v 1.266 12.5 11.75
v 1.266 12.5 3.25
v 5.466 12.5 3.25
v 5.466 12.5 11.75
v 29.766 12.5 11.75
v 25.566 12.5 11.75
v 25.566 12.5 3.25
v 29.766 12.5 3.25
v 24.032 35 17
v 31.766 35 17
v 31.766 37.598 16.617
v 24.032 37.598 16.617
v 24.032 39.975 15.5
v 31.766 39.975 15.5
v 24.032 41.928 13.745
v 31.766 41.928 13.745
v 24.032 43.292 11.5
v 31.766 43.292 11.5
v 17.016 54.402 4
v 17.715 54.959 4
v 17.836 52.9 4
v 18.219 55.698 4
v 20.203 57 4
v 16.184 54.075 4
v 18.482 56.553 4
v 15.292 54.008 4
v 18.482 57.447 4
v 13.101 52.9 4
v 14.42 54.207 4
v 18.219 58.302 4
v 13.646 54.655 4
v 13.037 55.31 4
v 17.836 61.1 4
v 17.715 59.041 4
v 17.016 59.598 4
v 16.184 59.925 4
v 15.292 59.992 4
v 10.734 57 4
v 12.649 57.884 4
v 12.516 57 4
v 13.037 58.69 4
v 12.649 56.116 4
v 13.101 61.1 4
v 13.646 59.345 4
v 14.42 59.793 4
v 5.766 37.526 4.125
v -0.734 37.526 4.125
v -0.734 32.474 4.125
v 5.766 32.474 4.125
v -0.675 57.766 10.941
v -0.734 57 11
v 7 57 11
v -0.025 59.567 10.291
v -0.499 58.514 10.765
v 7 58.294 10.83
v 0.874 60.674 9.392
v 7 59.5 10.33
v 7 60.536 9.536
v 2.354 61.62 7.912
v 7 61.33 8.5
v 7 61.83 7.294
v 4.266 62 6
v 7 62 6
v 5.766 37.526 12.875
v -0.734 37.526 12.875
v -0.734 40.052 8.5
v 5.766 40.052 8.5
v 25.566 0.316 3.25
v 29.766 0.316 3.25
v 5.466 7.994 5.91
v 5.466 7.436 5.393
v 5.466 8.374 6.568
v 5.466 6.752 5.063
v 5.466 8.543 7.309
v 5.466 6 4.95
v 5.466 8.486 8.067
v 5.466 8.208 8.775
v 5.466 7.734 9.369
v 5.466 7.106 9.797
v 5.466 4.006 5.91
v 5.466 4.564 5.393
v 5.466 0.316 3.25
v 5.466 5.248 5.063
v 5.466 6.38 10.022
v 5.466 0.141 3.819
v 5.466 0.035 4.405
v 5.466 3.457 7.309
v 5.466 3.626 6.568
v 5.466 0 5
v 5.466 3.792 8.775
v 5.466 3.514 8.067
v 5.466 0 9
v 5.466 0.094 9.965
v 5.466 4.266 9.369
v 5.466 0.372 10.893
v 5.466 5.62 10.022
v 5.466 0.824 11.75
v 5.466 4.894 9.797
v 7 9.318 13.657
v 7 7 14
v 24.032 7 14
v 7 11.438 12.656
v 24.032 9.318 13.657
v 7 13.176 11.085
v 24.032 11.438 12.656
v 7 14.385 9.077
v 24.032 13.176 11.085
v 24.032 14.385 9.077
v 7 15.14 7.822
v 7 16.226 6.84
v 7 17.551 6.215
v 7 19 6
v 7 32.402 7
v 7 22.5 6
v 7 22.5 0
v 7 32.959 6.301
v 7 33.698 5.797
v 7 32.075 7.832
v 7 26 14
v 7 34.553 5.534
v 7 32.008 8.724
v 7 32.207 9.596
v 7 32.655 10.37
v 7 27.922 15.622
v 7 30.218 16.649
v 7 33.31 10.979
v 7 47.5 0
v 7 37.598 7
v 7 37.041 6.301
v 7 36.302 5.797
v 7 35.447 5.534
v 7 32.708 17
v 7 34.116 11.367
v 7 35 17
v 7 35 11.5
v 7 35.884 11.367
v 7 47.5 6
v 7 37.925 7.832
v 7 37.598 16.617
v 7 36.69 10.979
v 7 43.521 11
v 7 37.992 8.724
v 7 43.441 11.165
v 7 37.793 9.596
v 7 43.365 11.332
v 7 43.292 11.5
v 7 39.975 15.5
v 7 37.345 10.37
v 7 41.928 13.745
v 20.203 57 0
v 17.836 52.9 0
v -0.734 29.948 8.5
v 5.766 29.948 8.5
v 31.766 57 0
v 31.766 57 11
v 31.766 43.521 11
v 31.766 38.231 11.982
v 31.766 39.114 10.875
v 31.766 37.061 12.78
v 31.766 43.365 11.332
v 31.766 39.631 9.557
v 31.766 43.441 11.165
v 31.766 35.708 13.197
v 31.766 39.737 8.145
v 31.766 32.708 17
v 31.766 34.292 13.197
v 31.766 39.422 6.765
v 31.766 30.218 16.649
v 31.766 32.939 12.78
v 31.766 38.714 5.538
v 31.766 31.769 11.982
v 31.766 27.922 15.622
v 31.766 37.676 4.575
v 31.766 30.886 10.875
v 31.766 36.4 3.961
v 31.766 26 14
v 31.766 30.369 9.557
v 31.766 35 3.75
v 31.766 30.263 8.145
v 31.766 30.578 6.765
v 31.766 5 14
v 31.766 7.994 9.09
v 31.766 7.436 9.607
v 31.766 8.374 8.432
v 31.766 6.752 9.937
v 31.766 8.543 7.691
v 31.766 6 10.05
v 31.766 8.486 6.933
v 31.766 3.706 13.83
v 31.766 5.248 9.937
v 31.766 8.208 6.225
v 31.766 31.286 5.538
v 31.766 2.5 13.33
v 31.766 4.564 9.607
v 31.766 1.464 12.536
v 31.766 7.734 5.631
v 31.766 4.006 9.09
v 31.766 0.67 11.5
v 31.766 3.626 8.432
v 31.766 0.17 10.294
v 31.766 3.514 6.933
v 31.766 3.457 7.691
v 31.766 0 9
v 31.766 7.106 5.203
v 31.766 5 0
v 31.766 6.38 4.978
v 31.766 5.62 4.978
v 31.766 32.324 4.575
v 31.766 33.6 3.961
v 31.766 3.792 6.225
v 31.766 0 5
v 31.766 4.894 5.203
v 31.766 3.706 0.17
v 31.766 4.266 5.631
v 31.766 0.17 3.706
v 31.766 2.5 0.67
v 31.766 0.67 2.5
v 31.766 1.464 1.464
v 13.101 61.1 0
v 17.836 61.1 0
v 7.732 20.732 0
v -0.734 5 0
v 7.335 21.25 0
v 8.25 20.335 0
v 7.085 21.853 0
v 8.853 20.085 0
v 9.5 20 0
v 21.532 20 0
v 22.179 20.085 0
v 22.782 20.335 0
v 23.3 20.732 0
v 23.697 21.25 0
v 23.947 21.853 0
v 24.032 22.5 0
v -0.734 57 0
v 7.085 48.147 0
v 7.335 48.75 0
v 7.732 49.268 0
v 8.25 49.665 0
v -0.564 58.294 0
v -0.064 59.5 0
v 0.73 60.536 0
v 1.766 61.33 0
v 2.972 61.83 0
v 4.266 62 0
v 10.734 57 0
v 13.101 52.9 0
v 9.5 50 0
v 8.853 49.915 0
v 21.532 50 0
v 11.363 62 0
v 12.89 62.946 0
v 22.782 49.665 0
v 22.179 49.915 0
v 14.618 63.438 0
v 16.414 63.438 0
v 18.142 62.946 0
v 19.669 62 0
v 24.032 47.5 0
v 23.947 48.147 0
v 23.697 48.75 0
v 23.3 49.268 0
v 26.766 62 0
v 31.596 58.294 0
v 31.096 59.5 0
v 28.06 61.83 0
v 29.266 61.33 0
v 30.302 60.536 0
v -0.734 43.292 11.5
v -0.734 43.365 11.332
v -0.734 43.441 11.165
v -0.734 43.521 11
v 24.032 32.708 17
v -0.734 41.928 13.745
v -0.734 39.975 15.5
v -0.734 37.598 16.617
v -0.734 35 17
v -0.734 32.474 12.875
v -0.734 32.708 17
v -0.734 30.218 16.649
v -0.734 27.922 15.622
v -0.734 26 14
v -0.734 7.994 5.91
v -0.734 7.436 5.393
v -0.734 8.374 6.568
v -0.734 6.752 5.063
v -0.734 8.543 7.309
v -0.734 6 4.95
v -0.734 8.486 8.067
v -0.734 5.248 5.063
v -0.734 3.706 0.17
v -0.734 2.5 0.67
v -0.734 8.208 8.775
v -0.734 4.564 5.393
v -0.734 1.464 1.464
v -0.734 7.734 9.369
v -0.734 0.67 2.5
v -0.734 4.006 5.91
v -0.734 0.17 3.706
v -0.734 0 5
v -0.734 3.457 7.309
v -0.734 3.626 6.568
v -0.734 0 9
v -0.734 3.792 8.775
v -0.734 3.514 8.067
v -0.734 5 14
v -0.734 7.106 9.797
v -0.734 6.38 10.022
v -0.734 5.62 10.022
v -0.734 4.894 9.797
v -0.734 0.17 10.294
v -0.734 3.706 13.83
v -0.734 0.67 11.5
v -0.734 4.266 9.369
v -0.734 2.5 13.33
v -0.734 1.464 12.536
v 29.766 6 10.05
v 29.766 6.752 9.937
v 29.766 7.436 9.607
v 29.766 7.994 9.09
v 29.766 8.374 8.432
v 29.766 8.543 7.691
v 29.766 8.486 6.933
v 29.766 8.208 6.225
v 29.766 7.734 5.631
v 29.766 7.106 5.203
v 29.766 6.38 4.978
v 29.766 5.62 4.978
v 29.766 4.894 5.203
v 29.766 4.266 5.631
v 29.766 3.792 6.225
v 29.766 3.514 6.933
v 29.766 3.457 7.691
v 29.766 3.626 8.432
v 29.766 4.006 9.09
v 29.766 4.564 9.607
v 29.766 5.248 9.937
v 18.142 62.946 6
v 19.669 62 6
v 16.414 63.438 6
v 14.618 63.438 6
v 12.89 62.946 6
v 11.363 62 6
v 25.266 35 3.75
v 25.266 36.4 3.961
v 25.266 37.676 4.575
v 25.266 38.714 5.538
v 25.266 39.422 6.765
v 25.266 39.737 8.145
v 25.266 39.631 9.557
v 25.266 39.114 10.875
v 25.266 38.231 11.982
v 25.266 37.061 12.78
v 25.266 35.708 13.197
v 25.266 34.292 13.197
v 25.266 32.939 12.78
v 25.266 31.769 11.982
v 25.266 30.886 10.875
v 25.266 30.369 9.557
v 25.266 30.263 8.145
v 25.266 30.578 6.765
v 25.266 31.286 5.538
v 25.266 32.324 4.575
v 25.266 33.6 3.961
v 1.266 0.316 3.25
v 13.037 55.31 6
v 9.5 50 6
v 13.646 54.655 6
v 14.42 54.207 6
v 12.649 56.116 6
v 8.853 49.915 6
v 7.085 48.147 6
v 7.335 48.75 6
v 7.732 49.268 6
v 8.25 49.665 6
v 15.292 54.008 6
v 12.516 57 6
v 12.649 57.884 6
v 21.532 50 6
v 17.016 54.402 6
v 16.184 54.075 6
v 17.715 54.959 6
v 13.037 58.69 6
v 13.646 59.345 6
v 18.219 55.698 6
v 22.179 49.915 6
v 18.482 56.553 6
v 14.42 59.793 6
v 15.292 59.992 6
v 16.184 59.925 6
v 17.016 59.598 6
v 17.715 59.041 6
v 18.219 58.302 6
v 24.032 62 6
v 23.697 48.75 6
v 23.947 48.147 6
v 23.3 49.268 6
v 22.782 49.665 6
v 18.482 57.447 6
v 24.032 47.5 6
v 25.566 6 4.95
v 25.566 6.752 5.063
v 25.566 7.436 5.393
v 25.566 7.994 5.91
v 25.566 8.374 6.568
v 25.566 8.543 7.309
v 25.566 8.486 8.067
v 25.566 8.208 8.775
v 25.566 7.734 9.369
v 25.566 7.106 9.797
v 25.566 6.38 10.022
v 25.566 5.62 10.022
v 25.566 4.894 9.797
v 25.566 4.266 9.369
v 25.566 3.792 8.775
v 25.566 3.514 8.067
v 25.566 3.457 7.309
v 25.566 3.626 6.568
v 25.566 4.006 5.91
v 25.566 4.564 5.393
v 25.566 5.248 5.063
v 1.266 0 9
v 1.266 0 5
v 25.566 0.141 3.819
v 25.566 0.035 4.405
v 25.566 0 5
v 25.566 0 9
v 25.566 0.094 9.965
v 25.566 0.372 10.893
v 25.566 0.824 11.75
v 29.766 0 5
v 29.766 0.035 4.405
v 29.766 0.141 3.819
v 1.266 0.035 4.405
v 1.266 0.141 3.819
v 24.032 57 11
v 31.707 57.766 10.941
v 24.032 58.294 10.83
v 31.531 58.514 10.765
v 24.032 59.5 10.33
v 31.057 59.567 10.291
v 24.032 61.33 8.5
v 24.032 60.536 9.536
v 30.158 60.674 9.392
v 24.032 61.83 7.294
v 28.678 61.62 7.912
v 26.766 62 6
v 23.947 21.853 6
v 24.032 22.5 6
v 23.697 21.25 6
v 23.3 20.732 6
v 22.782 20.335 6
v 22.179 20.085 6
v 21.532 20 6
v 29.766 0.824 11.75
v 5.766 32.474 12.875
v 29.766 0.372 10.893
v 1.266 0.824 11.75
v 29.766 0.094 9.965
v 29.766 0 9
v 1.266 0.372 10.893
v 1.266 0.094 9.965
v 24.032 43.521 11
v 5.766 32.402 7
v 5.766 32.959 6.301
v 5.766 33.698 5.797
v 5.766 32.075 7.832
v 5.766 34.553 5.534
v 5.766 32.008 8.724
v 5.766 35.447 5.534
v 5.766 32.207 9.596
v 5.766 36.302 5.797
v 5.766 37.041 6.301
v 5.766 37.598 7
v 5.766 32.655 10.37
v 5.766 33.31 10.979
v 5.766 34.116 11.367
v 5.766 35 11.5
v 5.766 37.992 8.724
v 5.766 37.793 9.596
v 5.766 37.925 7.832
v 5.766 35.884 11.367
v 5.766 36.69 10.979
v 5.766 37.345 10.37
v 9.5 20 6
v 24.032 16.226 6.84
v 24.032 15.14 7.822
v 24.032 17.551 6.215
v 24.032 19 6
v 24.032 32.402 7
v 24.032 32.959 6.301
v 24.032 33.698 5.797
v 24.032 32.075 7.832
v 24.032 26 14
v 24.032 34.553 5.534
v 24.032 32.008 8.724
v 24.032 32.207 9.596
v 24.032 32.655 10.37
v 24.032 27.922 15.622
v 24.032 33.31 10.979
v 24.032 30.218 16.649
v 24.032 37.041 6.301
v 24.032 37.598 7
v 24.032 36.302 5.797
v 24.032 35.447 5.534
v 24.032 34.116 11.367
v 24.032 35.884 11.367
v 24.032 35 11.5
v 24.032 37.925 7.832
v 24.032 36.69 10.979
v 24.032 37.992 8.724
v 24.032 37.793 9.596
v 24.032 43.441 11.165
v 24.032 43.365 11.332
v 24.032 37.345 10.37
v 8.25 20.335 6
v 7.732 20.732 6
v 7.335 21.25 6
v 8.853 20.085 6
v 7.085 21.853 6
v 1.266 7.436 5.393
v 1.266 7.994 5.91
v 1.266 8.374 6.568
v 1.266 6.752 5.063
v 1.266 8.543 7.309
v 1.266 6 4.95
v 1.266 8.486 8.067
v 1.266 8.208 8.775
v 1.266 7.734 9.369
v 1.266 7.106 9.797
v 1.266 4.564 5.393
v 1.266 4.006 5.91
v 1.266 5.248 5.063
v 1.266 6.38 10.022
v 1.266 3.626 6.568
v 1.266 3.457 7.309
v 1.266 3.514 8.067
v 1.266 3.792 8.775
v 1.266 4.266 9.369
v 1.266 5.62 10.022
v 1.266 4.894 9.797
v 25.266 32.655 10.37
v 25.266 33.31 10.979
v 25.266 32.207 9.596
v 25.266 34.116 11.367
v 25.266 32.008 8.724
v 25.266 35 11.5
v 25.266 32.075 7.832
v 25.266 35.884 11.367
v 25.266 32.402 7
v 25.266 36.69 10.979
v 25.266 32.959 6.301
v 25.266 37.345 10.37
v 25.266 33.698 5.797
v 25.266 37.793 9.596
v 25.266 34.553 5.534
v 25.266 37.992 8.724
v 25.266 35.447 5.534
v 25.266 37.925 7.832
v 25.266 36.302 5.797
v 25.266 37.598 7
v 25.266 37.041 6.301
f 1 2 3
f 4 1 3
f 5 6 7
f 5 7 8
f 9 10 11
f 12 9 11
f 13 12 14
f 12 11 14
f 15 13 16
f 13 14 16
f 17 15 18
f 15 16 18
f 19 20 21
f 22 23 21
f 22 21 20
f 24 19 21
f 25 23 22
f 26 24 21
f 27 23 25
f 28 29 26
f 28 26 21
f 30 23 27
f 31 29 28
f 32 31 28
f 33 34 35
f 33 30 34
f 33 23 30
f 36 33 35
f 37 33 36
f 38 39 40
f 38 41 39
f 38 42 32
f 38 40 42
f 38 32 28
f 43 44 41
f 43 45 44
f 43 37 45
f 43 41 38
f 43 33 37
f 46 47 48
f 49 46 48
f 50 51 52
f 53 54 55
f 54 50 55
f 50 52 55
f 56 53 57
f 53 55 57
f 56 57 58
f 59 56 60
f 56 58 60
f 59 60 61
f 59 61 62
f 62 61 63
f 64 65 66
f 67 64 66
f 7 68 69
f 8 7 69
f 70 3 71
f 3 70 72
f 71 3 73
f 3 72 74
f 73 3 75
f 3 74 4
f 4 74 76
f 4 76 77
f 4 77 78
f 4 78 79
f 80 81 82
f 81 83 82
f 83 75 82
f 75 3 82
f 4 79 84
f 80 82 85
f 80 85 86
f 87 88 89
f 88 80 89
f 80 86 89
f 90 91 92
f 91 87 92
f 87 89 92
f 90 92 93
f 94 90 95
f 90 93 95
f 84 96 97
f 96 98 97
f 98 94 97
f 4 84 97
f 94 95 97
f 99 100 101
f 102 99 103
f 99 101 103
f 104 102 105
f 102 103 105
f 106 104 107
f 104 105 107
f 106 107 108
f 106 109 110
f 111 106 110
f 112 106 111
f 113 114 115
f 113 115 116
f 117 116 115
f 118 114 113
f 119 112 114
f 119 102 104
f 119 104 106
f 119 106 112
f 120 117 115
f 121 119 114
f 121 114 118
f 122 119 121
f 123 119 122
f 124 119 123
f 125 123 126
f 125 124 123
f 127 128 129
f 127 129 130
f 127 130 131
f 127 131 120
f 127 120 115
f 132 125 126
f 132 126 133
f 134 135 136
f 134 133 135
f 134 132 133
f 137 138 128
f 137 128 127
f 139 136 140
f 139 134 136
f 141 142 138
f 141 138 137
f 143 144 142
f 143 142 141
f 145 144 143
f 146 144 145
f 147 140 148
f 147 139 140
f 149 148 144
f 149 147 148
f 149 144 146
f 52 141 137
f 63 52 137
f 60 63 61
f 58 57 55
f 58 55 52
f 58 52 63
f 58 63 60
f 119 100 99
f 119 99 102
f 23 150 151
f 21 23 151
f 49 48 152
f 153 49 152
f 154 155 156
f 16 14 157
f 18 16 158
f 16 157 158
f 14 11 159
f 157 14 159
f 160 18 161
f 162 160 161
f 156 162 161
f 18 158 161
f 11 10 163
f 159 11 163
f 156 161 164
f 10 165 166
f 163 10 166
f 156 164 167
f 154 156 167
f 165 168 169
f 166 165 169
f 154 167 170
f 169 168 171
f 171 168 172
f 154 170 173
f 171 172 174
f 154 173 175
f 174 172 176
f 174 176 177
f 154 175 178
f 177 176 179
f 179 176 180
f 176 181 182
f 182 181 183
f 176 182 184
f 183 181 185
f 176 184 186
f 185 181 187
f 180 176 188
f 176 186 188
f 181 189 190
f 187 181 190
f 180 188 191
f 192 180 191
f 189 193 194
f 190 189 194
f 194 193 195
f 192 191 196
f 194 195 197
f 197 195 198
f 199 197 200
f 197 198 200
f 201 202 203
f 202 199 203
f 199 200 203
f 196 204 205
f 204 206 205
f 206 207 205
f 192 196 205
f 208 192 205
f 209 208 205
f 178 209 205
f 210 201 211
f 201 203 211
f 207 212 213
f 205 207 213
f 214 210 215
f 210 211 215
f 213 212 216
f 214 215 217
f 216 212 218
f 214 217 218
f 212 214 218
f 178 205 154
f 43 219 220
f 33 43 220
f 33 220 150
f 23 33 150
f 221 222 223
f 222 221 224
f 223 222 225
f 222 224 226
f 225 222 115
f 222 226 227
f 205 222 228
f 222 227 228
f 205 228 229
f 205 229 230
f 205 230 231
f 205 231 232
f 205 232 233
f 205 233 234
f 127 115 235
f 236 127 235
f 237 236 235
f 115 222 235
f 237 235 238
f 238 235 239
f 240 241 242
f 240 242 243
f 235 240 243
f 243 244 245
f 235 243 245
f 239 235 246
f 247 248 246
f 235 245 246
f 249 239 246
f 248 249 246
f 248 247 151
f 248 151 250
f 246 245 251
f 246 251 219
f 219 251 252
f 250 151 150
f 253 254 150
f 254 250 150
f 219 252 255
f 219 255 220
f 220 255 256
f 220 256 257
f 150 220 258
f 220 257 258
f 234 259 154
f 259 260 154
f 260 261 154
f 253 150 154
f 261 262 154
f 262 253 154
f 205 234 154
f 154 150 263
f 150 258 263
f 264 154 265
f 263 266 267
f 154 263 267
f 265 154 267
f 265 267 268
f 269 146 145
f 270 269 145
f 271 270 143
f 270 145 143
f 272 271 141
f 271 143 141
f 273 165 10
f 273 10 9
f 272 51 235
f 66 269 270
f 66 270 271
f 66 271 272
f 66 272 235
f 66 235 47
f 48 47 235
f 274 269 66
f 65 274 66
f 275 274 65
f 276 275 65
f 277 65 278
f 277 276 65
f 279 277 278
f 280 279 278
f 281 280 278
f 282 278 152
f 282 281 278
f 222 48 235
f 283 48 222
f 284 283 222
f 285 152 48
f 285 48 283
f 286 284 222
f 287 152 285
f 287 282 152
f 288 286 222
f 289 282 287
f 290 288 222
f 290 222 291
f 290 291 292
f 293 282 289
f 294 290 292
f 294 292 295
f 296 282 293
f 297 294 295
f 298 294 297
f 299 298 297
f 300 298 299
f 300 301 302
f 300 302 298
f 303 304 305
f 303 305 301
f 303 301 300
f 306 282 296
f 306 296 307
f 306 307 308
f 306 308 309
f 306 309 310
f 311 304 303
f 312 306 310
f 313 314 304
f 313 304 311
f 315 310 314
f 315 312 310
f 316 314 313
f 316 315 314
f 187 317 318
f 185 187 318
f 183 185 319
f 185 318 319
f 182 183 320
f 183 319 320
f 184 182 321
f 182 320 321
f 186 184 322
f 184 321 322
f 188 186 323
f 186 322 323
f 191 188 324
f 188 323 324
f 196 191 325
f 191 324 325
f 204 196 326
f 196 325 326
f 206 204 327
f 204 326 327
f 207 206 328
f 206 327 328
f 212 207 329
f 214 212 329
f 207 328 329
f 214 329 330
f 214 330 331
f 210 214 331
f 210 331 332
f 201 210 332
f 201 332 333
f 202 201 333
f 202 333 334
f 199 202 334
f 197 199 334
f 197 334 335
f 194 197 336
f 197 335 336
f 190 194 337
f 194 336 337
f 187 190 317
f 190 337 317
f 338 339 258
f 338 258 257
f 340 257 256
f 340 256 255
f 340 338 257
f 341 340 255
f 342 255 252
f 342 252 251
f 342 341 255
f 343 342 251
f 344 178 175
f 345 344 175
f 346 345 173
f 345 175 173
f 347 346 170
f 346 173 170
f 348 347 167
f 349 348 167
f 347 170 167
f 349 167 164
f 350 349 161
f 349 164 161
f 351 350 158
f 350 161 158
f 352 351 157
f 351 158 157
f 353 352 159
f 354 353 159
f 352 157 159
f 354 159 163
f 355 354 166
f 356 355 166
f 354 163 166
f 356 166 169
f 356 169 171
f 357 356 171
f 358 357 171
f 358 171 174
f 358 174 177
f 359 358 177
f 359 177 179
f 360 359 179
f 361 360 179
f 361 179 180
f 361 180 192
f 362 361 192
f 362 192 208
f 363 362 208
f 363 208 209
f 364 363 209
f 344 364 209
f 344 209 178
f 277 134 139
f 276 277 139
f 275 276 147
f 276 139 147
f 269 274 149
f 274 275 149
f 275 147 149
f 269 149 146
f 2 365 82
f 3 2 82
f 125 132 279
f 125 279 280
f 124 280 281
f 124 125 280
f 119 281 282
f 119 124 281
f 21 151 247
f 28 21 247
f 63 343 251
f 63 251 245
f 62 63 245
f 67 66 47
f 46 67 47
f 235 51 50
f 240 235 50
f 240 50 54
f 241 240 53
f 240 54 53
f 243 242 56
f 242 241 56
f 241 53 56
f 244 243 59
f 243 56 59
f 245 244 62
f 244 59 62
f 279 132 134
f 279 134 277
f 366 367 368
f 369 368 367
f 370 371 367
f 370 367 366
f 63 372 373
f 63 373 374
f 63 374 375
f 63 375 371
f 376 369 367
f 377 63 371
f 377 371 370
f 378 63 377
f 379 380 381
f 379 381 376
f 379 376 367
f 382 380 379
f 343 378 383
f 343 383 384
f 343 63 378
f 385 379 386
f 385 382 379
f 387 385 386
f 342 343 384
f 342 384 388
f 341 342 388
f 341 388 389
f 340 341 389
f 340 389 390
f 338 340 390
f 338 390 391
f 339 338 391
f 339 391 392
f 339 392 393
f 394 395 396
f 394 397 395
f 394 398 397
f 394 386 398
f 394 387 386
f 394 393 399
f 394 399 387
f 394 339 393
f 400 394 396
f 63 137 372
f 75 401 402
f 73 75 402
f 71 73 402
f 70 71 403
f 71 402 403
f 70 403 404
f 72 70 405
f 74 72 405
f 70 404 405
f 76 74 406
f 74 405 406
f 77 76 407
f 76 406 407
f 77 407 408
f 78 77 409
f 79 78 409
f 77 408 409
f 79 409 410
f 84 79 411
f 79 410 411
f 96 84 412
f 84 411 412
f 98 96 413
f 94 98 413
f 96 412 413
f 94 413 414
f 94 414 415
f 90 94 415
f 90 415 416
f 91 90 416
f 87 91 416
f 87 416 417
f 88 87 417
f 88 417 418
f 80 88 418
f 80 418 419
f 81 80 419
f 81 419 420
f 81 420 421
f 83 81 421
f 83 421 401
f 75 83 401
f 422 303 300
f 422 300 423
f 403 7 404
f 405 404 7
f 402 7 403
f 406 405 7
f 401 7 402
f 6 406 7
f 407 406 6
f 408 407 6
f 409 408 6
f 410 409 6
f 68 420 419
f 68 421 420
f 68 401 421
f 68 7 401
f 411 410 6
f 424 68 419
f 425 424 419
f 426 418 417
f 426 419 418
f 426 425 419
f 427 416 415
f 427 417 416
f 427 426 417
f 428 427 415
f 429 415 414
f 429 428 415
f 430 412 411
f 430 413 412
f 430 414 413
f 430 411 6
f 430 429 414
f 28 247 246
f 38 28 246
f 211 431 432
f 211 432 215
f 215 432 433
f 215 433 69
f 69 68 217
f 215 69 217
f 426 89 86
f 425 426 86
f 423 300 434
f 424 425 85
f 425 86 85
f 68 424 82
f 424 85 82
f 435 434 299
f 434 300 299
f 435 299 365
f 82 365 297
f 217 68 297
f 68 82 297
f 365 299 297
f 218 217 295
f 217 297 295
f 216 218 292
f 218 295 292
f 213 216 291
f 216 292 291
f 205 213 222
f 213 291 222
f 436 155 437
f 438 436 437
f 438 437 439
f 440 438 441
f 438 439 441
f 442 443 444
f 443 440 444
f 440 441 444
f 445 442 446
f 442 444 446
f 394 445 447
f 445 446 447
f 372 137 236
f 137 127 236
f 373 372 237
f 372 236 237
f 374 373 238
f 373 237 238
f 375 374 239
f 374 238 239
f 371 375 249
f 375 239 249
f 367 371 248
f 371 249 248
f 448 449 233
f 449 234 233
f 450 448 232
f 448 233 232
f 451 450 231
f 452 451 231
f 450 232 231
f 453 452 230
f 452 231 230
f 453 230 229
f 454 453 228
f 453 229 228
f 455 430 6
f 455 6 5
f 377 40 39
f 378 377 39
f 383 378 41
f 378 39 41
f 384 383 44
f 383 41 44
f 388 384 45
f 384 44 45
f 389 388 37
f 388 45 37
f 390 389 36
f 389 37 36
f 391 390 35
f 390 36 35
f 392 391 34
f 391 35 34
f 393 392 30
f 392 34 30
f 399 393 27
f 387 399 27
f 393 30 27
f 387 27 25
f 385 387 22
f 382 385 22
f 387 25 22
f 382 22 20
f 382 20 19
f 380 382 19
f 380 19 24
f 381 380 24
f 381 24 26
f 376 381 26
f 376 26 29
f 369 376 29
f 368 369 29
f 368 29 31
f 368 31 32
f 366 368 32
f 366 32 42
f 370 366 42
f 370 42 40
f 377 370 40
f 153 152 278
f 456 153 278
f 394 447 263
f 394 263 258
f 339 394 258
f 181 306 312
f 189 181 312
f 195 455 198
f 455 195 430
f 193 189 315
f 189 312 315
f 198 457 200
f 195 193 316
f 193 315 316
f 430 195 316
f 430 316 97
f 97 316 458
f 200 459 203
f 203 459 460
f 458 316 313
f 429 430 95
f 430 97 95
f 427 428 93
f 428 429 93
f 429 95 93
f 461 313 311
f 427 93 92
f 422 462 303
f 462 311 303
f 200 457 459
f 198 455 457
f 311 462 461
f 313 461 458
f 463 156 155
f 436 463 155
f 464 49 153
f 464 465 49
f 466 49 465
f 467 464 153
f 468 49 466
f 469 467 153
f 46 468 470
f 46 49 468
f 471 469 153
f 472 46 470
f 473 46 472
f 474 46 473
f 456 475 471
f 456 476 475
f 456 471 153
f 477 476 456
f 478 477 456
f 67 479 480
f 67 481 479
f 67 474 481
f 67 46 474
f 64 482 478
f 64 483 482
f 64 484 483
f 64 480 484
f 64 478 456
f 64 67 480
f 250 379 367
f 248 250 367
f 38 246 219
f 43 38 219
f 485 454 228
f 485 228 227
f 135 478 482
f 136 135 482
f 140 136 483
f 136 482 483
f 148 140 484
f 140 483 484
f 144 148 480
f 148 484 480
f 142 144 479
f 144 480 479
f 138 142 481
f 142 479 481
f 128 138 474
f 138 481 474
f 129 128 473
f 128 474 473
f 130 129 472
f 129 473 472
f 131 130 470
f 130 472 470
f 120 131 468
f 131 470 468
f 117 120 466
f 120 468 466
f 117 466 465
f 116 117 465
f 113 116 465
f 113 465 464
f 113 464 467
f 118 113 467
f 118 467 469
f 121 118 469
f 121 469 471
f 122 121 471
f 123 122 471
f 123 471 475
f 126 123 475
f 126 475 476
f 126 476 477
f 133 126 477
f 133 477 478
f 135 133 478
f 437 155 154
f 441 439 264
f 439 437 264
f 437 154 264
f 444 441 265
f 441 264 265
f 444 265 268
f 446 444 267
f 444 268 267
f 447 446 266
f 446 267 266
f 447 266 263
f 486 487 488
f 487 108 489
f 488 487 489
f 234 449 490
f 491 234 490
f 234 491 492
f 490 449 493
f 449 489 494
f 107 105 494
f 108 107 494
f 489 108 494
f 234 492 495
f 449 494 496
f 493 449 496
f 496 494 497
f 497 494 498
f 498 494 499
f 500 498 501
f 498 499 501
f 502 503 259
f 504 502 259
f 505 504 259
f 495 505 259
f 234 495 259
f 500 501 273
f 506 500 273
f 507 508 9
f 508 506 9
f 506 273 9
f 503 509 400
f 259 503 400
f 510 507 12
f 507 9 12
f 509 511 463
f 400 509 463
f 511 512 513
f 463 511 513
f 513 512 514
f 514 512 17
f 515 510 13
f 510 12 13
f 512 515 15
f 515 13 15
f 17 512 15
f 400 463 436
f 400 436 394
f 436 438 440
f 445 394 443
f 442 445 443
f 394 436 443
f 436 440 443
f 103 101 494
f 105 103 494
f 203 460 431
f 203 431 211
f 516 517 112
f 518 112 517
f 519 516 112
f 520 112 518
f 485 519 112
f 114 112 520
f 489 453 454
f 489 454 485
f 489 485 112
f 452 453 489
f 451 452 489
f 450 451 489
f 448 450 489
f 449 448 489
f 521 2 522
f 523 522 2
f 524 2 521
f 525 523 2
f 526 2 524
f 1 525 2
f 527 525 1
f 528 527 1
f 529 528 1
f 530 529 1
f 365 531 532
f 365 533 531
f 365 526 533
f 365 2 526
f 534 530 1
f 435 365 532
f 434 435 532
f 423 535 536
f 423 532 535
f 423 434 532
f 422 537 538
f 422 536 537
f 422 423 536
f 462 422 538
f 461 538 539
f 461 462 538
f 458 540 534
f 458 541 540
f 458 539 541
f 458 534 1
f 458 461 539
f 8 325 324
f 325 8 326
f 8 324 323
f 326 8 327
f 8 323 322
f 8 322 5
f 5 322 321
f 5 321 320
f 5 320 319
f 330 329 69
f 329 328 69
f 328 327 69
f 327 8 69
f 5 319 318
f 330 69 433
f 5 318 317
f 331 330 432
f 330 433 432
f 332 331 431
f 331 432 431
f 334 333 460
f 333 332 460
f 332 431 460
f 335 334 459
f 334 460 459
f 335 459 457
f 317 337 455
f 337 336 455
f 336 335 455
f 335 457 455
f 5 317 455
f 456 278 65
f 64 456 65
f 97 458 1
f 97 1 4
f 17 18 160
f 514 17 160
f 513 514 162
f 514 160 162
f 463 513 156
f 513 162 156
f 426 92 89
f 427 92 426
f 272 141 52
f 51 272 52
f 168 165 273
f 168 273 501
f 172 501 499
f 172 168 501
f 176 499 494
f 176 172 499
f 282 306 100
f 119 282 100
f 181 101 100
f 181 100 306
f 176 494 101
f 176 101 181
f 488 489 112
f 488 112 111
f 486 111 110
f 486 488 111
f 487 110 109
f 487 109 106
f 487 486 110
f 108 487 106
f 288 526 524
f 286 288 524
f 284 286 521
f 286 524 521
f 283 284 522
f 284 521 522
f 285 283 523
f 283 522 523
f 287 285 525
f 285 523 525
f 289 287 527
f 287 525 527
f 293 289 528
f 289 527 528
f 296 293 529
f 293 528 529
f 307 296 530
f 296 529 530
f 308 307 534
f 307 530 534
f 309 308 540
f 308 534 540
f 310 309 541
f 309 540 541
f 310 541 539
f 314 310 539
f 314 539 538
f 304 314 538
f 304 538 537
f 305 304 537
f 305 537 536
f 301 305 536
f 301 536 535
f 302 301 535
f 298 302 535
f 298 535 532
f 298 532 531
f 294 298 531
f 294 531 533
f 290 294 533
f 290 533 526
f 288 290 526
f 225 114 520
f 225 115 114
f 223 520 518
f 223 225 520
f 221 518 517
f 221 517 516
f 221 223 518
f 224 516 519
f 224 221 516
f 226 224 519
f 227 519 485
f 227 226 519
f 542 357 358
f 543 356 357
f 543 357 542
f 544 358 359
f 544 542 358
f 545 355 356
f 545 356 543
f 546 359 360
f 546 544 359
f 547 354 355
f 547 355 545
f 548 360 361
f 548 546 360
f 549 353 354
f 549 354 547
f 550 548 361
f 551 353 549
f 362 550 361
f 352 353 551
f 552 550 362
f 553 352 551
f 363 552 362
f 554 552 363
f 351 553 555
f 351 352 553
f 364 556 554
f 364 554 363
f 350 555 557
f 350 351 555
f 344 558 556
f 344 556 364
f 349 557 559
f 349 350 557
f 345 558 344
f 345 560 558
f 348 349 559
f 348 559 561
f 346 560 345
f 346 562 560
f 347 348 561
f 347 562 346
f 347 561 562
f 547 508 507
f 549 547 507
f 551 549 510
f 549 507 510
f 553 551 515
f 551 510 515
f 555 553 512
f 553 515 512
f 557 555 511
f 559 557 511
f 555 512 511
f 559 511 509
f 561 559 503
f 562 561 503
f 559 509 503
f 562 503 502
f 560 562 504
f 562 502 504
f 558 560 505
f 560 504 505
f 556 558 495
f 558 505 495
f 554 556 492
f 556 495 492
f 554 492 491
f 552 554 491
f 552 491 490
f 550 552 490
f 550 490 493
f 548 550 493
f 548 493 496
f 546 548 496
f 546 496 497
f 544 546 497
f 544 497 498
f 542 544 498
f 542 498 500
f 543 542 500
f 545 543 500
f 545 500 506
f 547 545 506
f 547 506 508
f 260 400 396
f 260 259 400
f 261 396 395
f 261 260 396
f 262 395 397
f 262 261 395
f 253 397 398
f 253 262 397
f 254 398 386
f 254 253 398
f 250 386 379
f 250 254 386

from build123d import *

# Parameters (mm, degrees)
BOSS_EXTRUDE1_DEPTH            = 32.5
SKETCH2_W                      = 32.5
SKETCH2_H                      = 25.708203932
BOSS_EXTRUDE2_DEPTH            = 8
CUT_EXTRUDE1_DEPTH             = 17.032
SKETCH4_W                      = 32.5
SKETCH4_H                      = 8
BOSS_EXTRUDE3_DEPTH            = 7
SKETCH5_W                      = 7.734
SKETCH5_H                      = 11
BOSS_EXTRUDE4_DEPTH            = 29.291796068
SKETCH6_W                      = 7.734
SKETCH6_H                      = 11
BOSS_EXTRUDE5_DEPTH            = 29.291796068
SKETCH7_W                      = 17.032
SKETCH7_H                      = 30
BOSS_EXTRUDE6_DEPTH            = 6
CUT_EXTRUDE3_REACH             = 75.331
CUT_EXTRUDE4_DEPTH             = 6.5
CUT_EXTRUDE5_DEPTH             = 4
SKETCH12_W                     = 4.2
SKETCH12_H                     = 8.5
CUT_EXTRUDE6_DEPTH             = 12.5
SKETCH13_W                     = 4.2
SKETCH13_H                     = 8.5
CUT_EXTRUDE7_DEPTH             = 12.5
F_5_1_5_1_DIAMETER_HOLE1_D     = 5.1
F_5_1_5_1_DIAMETER_HOLE1_DEPTH = 2
F_5_1_5_1_DIAMETER_HOLE2_D     = 5.1
F_5_1_5_1_DIAMETER_HOLE2_DEPTH = 2
F_6_0_6_DIAMETER_HOLE1_D       = 6
F_6_0_6_DIAMETER_HOLE1_DEPTH   = 7.73405
HOLE1_D                        = 6
HOLE1_DEPTH                    = 32.50005
HOLE1_CBORE_D                  = 9.5
HOLE1_CBORE_DEPTH              = 6.5
F_6_0_6_DIAMETER_HOLE2_D       = 6
F_5_1_5_1_DIAMETER_HOLE3_D     = 5.1
F_5_1_5_1_DIAMETER_HOLE3_DEPTH = 26.30005
FILLET1_R                      = 2.5
FILLET2_R                      = 5


with BuildPart() as part:
    # Sketch1 → Boss-Extrude1 (new body)
    with BuildSketch(Plane(origin=(31.766, 0, 0), x_dir=(0, 0, -1), z_dir=(1, 0, 0))):
        with BuildLine():
            Line((-14, 26), (-14, 32.708203932))
            Line((-14, 32.708203932), (-17, 32.708203932))
            ThreePointArc((-17, 32.708203932), (-16.215838363, 29.033969318), (-14, 26))
        make_face()
    extrude(amount=-BOSS_EXTRUDE1_DEPTH)

    # Sketch2 → Boss-Extrude2 (add)
    with BuildSketch(Plane(origin=(0, 0, 14), x_dir=(-1, 0, 0), z_dir=(0, 0, -1))):
        with Locations((-15.516, 19.854101966)):
            Rectangle(SKETCH2_W, SKETCH2_H)
    extrude(amount=BOSS_EXTRUDE2_DEPTH)

    # Sketch3 → Cut-Extrude1 (cut)
    with BuildSketch(Plane(origin=(24.032, 0, 0), x_dir=(0, 0, -1), z_dir=(1, 0, 0))):
        with BuildLine():
            Line((-6, 15), (-6, 32.708203932))
            Line((-6, 32.708203932), (-17, 32.708203932))
            ThreePointArc((-17, 32.708203932), (-16.215838363, 29.033969318), (-14, 26))
            Line((-14, 26), (-14, 7))
            ThreePointArc((-14, 7), (-11.656854249, 12.656854249), (-6, 15))
        make_face()
    extrude(amount=-CUT_EXTRUDE1_DEPTH, mode=Mode.SUBTRACT)

    # Sketch4 → Boss-Extrude3 (add)
    with BuildSketch(Plane.XZ.offset(-7)):
        with Locations((15.516, 10)):
            Rectangle(SKETCH4_W, SKETCH4_H)
    extrude(amount=BOSS_EXTRUDE3_DEPTH)

    # Sketch5 → Boss-Extrude4 (add)
    with BuildSketch(Plane(origin=(0, 32.708203932, 0), x_dir=(-1, 0, 0), z_dir=(0, 1, 0))):
        with Locations((-27.899, 11.5)):
            Rectangle(SKETCH5_W, SKETCH5_H)
    extrude(amount=BOSS_EXTRUDE4_DEPTH)

    # Sketch6 → Boss-Extrude5 (add)
    with BuildSketch(Plane(origin=(0, 32.708203932, 0), x_dir=(-1, 0, 0), z_dir=(0, 1, 0))):
        with Locations((-3.133, 11.5)):
            Rectangle(SKETCH6_W, SKETCH6_H)
    extrude(amount=BOSS_EXTRUDE5_DEPTH)

    # Sketch7 → Boss-Extrude6 (add)
    with BuildSketch(Plane(origin=(0, 0, 6), x_dir=(-1, 0, 0), z_dir=(0, 0, -1))):
        with BuildLine():
            Line((0.734, 62), (0.734, 0))
            Line((0.734, 0), (-31.766, 0))
            Line((-31.766, 0), (-31.766, 62))
            Line((-31.766, 62), (-19.669311931, 62))
            ThreePointArc((-19.669311931, 62), (-15.516, 63.5), (-11.362688069, 62))
            Line((-11.362688069, 62), (0.734, 62))
        make_face()
        with Locations((-15.516, 35)):
            Rectangle(SKETCH7_W, SKETCH7_H, mode=Mode.SUBTRACT)
    extrude(amount=BOSS_EXTRUDE6_DEPTH)

    # Cut-Extrude3: up to this face of the body (flat: up to its plane)
    cut_extrude3_end = Plane(part.part.faces().sort_by_distance((-0.734, 32.469284898, 7.888317221))[0])
    # Sketch9 → Cut-Extrude3 (cut, up to the picked face)
    with BuildSketch(Plane(origin=(31.766, 0, 0), x_dir=(0, 0, -1), z_dir=(1, 0, 0)), mode=Mode.PRIVATE) as cut_extrude3_sk1:
        with BuildLine():
            Line((-11, 43.520866203), (-11, 62))
            Line((-11, 62), (-17, 62))
            Line((-17, 62), (-17, 35))
            ThreePointArc((-17, 35), (-15.5, 39.974937186), (-11.5, 43.291561976))
            ThreePointArc((-11.5, 43.291561976), (-11.248247728, 43.402393245), (-11, 43.520866203))
        make_face()
    cut_extrude3_tool1 = split(extrude(cut_extrude3_sk1.sketch, amount=-CUT_EXTRUDE3_REACH, mode=Mode.PRIVATE), bisect_by=cut_extrude3_end, keep=Keep.BOTH, mode=Mode.PRIVATE)
    add(cut_extrude3_tool1.solids().sort_by(Axis((31.766, 51.50501, 14.153169), (-1, 0, 0)))[0], mode=Mode.SUBTRACT)

    # Sketch10 → Cut-Extrude4 (cut)
    with BuildSketch(Plane.ZY.offset(0.734)):
        Polygon((8.5, 40.051814855), (4.125, 37.525907428), (4.125, 32.474092572), (8.5, 29.948185145), (12.875, 32.474092572), (12.875, 37.525907428), align=None)
    extrude(amount=-CUT_EXTRUDE4_DEPTH, mode=Mode.SUBTRACT)

    # Sketch11 → Cut-Extrude5 (cut)
    with BuildSketch(Plane(origin=(0, 0, 0), x_dir=(-1, 0, 0), z_dir=(0, 0, -1))):
        Polygon((-17.835622857, 61.1), (-20.202758961, 57), (-17.835622857, 52.9), (-13.10135065, 52.9), (-10.734214546, 57), (-13.10135065, 61.1), align=None)
    extrude(amount=-CUT_EXTRUDE5_DEPTH, mode=Mode.SUBTRACT)

    # Sketch12 → Cut-Extrude6 (cut)
    with BuildSketch(Plane.XZ):
        with Locations((27.666, 7.5)):
            Rectangle(SKETCH12_W, SKETCH12_H)
    extrude(amount=-CUT_EXTRUDE6_DEPTH, mode=Mode.SUBTRACT)

    # Sketch13 → Cut-Extrude7 (cut)
    with BuildSketch(Plane.XZ):
        with Locations((3.366, 7.5)):
            Rectangle(SKETCH13_W, SKETCH13_H)
    extrude(amount=-CUT_EXTRUDE7_DEPTH, mode=Mode.SUBTRACT)

    # Ø5.1 (5.1) Diameter Hole1
    with Locations(Plane(origin=(31.766, 0, 0), x_dir=(0, 0, -1), z_dir=(1, 0, 0))):
        with Locations((-7.5, 6)):
            Hole(F_5_1_5_1_DIAMETER_HOLE1_D / 2, depth=F_5_1_5_1_DIAMETER_HOLE1_DEPTH)

    # Ø5.1 (5.1) Diameter Hole2
    with Locations(Plane.ZY.offset(0.734)):
        with Locations((7.5, 6)):
            Hole(F_5_1_5_1_DIAMETER_HOLE2_D / 2, depth=F_5_1_5_1_DIAMETER_HOLE2_DEPTH)

    # Ø6.0 (6) Diameter Hole1
    with Locations(Plane(origin=(7, 0, 0), x_dir=(0, 0, -1), z_dir=(1, 0, 0))):
        with Locations((-8.5, 35)):
            Hole(F_6_0_6_DIAMETER_HOLE1_D / 2, depth=F_6_0_6_DIAMETER_HOLE1_DEPTH)

    # Hole1
    with Locations(Plane(origin=(31.766, 0, 0), x_dir=(0, 0, -1), z_dir=(1, 0, 0))):
        with Locations((-8.5, 35)):
            CounterBoreHole(HOLE1_D / 2, HOLE1_CBORE_D / 2, HOLE1_CBORE_DEPTH, depth=HOLE1_DEPTH)

    # Ø6.0 (6) Diameter Hole2 (through all)
    with Locations(Plane.XY.offset(6)):
        with Locations((15.516, 57)):
            Hole(F_6_0_6_DIAMETER_HOLE2_D / 2)

    # Ø5.1 (5.1) Diameter Hole3
    with Locations(Plane.ZY.offset(-5.466)):
        with Locations((7.5, 6)):
            Hole(F_5_1_5_1_DIAMETER_HOLE3_D / 2, depth=F_5_1_5_1_DIAMETER_HOLE3_DEPTH)

    # Fillet1
    fillet1_edges = [part.edges().sort_by_distance(p)[0] for p in [
        (7, 20, 3),
        (24.032, 20, 3),
        (7, 50, 3),
        (24.032, 50, 3),
    ]]
    fillet(fillet1_edges, radius=FILLET1_R)

    # Fillet2
    # the kernel refuses this fillet: 5 mm, written as the material it adds along each edge
    with BuildSketch(Plane(origin=(34.032, 15, 6), x_dir=(0, 1, 0), z_dir=(-1, 0, 0))) as fillet2_piece_1_section:
        with BuildLine():
            CenterArc((4, -5), FILLET2_R, 90, 67.380135052)
            ThreePointArc((-0.615384615, -3.076923077), (-0.155354594, -1.568929081), (0, 0))
            Line((0, 0), (4, 0))
        make_face()
    fillet2_piece_1 = extrude(amount=27.032, mode=Mode.PRIVATE)
    fillet2_piece_1 = split(fillet2_piece_1, bisect_by=Plane(origin=(31.766, 15.849865024, 6.687390225), z_dir=(-1, 0, 0)), keep=Keep.TOP, mode=Mode.PRIVATE)
    add(fillet2_piece_1)
    # the kernel refuses this fillet: 5 mm, written as the material it takes off along each edge
    with BuildSketch(Plane(origin=(-0.734, 62, 23.5), x_dir=(1, 0, 0), z_dir=(0, 0, -1)), Plane(origin=(31.766, 62, -12.5), x_dir=(-1, 0, 0), z_dir=(0, 0, 1))) as fillet2_2_piece_1:
        with BuildLine():
            CenterArc((FILLET2_R, FILLET2_R), FILLET2_R, 180, 90)
            Line((0, FILLET2_R), (0, 0))
            Line((0, 0), (FILLET2_R, 0))
        make_face()
    extrude(amount=36, mode=Mode.SUBTRACT)
    with BuildSketch(Plane(origin=(-13.234, 0, 0), x_dir=(0, 1, 0), z_dir=(1, 0, 0))) as fillet2_2_piece_2:
        with BuildLine():
            CenterArc((FILLET2_R, FILLET2_R), FILLET2_R, 180, 90)
            Line((0, FILLET2_R), (0, 0))
            Line((0, 0), (FILLET2_R, 0))
        make_face()
    extrude(amount=57.5, mode=Mode.SUBTRACT)
    with BuildSketch(Plane(origin=(44.266, 62, 11), x_dir=(0, -1, 0), z_dir=(-1, 0, 0))) as fillet2_2_piece_3:
        with BuildLine():
            CenterArc((FILLET2_R, -FILLET2_R), FILLET2_R, 90, 90)
            Line((0, -FILLET2_R), (0, 0))
            Line((0, 0), (FILLET2_R, 0))
        make_face()
    extrude(amount=32.734, mode=Mode.SUBTRACT)
    with BuildSketch(Plane(origin=(-13.234, 0, 14), x_dir=(0, 1, 0), z_dir=(1, 0, 0))) as fillet2_2_piece_4:
        with BuildLine():
            CenterArc((FILLET2_R, -FILLET2_R), FILLET2_R, 90, 90)
            Line((0, -FILLET2_R), (0, 0))
            Line((0, 0), (FILLET2_R, 0))
        make_face()
    extrude(amount=57.5, mode=Mode.SUBTRACT)
    with BuildSketch(Plane(origin=(19.5, 62, 11), x_dir=(0, 0, -1), z_dir=(-1, 0, 0))) as fillet2_2_piece_5:
        with BuildLine():
            CenterArc((FILLET2_R, FILLET2_R), FILLET2_R, 180, 90)
            Line((0, FILLET2_R), (0, 0))
            Line((0, 0), (FILLET2_R, 0))
        make_face()
    extrude(amount=32.734, mode=Mode.SUBTRACT)


solid = part.part
